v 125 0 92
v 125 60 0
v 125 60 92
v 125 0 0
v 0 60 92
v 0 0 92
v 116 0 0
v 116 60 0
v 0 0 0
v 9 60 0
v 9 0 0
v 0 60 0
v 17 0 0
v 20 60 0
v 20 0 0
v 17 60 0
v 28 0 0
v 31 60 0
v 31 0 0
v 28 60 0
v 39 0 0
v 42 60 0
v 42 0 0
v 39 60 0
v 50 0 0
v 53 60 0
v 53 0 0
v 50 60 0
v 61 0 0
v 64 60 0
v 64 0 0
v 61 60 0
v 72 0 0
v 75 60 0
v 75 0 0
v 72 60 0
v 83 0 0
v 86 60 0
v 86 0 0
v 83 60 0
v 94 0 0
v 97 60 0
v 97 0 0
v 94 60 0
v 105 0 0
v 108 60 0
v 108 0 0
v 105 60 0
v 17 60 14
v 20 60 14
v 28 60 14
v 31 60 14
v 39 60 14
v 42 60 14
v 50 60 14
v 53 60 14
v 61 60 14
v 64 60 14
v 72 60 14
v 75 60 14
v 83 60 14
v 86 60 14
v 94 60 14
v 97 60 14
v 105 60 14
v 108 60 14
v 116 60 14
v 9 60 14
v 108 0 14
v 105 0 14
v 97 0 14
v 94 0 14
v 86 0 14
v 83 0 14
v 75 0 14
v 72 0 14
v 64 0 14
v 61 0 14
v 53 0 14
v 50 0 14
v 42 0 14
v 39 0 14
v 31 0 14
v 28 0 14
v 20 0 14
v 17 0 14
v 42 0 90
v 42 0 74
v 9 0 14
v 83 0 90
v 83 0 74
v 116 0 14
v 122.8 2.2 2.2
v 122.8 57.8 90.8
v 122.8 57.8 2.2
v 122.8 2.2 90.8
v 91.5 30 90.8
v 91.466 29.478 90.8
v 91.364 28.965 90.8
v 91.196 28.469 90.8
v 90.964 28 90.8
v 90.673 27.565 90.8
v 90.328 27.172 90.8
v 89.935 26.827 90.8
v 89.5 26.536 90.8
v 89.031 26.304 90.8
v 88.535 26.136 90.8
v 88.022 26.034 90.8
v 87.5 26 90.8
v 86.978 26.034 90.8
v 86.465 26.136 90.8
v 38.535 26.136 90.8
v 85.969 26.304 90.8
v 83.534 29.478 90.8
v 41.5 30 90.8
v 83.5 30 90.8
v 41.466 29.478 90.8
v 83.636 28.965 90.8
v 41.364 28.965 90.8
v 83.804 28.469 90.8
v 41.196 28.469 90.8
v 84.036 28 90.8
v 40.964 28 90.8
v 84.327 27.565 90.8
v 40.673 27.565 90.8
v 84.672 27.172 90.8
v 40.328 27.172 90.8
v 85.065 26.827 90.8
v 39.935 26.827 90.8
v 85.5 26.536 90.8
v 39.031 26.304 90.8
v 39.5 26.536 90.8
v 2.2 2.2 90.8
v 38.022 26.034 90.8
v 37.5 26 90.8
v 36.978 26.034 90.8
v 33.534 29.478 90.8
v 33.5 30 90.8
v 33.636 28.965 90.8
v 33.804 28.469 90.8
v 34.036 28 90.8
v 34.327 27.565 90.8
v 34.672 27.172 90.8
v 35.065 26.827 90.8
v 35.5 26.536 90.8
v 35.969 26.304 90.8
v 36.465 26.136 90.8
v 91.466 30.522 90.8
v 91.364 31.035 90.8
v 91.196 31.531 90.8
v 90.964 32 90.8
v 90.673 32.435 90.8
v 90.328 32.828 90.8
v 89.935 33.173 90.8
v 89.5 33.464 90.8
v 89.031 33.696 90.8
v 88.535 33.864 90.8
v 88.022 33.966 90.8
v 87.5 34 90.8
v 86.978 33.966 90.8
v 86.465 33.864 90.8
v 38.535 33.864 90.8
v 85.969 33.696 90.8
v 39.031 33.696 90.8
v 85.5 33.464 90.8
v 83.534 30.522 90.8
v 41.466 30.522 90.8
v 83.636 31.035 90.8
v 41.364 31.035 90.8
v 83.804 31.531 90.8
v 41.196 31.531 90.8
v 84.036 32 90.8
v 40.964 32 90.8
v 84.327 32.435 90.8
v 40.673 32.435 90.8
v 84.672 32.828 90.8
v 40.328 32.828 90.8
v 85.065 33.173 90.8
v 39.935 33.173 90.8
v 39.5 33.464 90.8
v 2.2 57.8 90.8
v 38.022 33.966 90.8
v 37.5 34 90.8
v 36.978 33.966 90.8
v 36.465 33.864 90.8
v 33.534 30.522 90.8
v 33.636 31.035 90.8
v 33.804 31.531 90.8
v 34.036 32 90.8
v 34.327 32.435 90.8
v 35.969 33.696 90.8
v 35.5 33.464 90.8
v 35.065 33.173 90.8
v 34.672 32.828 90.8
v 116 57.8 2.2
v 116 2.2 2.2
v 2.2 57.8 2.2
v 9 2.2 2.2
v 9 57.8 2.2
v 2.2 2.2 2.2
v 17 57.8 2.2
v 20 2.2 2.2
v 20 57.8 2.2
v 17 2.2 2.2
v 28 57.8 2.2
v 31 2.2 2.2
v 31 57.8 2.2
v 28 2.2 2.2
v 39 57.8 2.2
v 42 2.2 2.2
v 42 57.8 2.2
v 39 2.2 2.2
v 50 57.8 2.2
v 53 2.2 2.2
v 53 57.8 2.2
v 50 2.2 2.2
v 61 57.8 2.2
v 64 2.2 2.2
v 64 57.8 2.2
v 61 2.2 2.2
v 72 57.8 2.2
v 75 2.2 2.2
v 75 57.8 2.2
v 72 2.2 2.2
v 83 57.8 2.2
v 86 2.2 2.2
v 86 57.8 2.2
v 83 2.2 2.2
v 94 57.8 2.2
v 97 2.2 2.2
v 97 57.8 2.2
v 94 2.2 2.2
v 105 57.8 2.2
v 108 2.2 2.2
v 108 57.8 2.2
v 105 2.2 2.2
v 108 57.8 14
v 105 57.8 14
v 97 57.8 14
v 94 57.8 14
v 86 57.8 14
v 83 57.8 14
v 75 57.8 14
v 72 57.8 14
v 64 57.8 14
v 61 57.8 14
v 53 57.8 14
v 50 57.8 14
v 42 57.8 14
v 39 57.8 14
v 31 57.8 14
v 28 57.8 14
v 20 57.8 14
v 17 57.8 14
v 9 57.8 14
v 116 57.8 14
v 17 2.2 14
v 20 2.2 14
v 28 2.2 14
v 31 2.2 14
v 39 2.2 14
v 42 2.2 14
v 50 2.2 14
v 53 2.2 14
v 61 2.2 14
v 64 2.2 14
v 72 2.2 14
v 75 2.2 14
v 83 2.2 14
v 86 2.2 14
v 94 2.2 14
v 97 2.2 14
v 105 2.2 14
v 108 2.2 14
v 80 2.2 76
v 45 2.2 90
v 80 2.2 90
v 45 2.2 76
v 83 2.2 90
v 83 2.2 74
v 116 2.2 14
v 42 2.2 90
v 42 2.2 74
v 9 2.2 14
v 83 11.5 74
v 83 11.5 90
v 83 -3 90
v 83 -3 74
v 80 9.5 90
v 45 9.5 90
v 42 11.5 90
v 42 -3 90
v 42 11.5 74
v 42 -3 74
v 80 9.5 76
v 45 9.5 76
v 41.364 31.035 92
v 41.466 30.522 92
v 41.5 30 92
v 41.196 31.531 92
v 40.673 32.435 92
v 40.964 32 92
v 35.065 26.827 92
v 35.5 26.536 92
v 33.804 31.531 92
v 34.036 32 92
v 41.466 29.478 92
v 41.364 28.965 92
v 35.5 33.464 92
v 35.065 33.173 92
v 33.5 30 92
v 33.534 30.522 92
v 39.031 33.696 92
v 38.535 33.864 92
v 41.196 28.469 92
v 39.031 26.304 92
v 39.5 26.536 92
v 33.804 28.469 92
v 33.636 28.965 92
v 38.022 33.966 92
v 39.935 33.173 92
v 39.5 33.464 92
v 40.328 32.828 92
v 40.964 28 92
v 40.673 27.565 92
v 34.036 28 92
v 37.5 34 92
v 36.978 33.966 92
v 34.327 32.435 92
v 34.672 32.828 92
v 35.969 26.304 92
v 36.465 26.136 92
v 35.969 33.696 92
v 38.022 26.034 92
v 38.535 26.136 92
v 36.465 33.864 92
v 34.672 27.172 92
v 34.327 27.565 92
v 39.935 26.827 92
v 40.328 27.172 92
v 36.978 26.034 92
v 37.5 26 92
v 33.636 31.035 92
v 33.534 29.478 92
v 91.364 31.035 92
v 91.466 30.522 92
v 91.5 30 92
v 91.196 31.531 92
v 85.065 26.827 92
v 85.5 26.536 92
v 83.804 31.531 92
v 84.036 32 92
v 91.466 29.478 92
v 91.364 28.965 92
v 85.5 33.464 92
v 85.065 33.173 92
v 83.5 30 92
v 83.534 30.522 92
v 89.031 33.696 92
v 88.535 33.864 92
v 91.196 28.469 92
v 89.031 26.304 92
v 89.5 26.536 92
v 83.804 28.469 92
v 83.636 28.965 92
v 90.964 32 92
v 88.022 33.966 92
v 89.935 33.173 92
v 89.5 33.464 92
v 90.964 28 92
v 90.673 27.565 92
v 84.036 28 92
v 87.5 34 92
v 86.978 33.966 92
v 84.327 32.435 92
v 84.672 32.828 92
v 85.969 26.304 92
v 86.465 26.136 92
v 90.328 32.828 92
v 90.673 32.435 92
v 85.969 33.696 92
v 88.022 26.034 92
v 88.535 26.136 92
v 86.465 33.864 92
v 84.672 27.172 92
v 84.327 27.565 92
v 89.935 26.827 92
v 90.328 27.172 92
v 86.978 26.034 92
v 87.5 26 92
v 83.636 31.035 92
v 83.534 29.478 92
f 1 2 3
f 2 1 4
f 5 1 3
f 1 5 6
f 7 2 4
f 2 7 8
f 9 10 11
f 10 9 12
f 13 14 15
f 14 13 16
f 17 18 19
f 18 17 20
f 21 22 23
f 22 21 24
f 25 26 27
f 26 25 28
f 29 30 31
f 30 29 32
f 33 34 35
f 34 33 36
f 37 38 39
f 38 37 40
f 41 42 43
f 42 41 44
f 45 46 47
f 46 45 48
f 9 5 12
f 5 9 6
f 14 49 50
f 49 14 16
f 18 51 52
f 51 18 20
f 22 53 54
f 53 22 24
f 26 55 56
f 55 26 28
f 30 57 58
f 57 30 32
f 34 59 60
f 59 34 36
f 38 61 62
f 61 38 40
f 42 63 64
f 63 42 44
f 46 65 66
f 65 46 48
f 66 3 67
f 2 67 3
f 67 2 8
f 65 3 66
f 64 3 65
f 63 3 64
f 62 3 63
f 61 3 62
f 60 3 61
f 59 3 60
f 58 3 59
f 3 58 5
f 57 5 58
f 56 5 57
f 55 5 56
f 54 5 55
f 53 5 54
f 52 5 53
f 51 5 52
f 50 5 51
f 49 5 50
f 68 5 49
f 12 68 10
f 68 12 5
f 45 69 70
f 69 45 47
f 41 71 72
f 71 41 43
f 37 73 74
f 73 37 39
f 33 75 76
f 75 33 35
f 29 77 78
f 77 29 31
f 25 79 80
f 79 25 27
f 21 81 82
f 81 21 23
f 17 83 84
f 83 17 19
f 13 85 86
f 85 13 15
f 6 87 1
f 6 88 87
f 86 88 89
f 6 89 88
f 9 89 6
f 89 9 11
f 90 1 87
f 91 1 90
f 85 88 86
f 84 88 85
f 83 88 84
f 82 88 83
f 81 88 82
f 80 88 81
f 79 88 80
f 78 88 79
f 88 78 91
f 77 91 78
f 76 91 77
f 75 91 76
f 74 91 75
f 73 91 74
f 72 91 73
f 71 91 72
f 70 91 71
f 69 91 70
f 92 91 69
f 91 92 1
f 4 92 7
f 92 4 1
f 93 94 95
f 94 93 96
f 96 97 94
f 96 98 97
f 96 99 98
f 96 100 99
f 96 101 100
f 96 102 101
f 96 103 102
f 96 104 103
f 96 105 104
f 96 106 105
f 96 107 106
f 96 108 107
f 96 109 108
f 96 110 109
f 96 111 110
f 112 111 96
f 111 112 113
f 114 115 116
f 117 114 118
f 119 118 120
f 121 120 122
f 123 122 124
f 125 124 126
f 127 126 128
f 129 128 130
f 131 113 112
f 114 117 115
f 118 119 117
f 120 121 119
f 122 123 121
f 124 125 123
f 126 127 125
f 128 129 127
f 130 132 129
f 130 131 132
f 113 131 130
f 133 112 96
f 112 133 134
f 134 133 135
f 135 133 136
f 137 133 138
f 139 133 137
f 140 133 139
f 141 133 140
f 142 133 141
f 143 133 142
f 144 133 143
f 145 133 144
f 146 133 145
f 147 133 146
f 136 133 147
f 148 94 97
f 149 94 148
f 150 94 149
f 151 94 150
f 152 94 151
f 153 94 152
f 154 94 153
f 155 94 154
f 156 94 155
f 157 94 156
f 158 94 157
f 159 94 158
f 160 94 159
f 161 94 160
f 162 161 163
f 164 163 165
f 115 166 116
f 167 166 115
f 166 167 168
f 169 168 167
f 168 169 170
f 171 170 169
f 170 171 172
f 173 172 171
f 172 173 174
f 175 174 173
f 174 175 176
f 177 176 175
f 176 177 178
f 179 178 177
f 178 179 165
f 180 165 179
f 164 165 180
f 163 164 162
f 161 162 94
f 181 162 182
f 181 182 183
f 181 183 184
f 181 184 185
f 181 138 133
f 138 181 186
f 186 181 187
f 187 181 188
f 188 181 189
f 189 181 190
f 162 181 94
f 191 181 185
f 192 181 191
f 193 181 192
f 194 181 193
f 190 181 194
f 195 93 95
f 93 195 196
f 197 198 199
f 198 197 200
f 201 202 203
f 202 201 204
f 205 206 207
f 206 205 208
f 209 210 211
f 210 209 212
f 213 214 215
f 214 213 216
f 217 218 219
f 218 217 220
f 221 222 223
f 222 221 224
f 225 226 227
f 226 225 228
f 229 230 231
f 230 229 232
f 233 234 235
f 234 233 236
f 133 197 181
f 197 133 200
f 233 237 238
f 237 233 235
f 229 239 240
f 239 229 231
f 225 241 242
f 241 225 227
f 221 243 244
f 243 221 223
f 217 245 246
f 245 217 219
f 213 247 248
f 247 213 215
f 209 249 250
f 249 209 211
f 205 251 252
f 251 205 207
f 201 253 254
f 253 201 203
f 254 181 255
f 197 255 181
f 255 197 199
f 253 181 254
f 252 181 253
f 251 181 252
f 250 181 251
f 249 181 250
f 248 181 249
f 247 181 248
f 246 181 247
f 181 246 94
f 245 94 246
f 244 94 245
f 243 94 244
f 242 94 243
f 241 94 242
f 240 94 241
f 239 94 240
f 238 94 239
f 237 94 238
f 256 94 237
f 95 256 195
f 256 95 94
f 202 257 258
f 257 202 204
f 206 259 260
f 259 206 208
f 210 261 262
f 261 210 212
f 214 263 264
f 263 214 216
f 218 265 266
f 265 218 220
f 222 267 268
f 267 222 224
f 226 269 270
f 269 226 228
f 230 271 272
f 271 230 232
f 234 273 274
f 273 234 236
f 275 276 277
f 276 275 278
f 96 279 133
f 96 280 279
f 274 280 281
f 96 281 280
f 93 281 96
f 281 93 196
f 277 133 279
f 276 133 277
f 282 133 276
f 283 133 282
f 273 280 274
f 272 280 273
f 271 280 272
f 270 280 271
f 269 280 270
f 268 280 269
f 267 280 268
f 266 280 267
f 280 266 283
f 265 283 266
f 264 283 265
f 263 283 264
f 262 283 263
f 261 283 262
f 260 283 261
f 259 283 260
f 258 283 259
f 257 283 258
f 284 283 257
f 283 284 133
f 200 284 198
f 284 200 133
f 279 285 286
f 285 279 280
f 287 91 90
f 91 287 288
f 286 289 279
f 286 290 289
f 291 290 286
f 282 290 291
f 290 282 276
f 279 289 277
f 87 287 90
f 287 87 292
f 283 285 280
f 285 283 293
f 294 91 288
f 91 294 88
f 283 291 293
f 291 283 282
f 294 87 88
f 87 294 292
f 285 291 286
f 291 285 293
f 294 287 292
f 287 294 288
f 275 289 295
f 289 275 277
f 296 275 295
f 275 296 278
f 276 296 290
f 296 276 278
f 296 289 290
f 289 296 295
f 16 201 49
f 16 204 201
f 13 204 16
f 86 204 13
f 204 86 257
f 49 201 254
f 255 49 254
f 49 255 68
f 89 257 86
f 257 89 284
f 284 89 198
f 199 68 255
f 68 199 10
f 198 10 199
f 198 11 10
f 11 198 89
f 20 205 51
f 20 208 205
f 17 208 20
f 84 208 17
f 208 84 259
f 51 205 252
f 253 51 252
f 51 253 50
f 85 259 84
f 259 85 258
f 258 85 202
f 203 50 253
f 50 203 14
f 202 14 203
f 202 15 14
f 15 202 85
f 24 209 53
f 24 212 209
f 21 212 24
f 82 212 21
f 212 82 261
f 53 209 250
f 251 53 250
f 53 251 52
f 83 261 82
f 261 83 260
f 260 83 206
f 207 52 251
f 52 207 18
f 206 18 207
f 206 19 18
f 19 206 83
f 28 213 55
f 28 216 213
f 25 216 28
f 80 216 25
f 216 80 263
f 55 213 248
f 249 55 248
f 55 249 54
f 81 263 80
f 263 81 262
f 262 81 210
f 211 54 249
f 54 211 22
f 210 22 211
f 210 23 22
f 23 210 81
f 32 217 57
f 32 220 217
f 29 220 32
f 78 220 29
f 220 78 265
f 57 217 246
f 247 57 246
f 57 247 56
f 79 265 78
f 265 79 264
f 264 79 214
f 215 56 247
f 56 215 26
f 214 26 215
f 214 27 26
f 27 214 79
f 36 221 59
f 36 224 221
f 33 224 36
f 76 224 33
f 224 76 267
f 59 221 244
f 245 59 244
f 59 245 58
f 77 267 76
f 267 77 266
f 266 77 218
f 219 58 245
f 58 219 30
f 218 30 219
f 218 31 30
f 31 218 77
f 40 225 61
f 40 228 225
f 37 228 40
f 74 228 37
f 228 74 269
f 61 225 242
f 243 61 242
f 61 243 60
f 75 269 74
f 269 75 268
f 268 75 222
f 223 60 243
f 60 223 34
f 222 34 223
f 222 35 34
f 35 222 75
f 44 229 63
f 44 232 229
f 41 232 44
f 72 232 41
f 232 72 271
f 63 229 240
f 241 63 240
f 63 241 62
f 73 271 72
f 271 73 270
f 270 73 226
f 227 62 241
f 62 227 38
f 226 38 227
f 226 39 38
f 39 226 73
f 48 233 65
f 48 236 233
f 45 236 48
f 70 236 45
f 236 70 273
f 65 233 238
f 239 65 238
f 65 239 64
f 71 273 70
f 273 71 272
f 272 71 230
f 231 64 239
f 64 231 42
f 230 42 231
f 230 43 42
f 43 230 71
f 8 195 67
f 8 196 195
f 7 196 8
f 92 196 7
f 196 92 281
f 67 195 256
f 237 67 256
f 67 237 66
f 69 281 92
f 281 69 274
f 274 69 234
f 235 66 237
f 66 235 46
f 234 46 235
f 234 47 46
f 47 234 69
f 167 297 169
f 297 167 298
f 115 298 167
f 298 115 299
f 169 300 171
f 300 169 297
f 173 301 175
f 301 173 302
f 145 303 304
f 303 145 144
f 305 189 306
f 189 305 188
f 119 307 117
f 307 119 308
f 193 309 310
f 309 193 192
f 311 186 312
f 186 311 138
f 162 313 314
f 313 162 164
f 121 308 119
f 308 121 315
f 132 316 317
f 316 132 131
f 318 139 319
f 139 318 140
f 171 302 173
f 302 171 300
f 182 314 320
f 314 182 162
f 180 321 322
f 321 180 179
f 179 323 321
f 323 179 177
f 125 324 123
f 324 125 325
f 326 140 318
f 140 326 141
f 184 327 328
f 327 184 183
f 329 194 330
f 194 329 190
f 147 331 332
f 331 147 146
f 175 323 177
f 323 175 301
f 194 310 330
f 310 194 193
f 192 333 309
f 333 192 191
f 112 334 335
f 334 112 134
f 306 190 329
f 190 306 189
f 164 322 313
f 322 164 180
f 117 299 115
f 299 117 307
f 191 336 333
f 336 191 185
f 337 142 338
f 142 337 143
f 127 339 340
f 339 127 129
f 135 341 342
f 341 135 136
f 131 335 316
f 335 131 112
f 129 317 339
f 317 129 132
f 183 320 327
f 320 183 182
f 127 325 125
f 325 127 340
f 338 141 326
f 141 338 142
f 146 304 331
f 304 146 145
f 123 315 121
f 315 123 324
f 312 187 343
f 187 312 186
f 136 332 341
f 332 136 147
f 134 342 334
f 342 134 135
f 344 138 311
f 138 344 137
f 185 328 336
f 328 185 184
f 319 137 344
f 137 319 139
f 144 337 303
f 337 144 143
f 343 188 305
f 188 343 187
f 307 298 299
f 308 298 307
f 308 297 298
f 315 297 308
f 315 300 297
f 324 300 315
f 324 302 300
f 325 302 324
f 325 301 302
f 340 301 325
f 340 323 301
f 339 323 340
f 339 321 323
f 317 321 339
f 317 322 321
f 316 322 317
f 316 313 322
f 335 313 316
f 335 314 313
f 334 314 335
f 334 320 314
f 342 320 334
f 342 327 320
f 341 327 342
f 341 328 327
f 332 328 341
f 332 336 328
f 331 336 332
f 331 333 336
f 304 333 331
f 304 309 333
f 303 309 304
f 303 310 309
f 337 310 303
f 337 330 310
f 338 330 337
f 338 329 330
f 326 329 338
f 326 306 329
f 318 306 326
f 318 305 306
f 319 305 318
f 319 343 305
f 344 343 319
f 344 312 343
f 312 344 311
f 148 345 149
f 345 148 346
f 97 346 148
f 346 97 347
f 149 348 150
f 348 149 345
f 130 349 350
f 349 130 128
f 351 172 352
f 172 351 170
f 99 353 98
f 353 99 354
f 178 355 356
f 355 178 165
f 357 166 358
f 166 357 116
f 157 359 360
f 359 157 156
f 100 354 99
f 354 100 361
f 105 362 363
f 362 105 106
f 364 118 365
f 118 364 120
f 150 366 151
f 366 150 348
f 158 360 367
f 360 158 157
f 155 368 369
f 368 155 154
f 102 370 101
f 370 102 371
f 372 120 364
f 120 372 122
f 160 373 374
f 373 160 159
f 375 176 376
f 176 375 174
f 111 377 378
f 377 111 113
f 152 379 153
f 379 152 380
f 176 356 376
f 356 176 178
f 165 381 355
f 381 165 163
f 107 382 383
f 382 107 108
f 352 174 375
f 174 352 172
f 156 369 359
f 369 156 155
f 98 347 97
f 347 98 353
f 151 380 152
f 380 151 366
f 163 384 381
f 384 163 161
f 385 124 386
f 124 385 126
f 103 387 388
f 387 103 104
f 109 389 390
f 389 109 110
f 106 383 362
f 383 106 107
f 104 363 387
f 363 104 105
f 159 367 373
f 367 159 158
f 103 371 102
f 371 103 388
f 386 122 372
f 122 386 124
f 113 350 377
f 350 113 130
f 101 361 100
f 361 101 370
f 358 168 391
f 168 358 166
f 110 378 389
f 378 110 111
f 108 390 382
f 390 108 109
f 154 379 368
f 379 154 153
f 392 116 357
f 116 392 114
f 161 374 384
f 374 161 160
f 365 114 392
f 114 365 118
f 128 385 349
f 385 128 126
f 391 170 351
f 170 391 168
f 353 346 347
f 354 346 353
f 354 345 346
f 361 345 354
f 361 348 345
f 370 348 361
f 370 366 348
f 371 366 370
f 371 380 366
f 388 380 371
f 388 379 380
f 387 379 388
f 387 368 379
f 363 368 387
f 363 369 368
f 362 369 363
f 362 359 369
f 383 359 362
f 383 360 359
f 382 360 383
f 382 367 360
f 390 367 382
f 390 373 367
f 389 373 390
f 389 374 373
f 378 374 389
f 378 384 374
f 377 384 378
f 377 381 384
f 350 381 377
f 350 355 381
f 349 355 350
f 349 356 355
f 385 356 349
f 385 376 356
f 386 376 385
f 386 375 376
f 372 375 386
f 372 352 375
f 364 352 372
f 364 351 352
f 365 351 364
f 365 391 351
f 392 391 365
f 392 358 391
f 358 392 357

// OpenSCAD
// Pano Beyni — DIN ray kutusu (parametrik OpenSCAD kaynagi)
// Sahip: Kisi C. Malzeme: V-0 (UL94/IEC 60695-11-10) polikarbonat, sartname 2.2.1.xiii.
// Referans govde: Fibox ARCA 92/125 sinifi (hardware/pano-beyni/bom.csv).
// Konnektorler io-tablosu.md ile birebir (J1-J10); alt kenarda vidali klemens kesikleri,
// ust kenarda anten delikleri (RF + hucresel, sartname 2.2.8.1.iv harici anten cikisi).
//
// NOT (STATUS.md karar #4): bu gelistirme ortaminda `openscad` calistirilamadi (kurulu degil,
// internet erisimi yok); dolayisiyla STL BU TESLIMDE URETILMEDI. Bu dosya OpenSCAD kurulu bir
// makinede `openscad -o din-kutu.stl din-kutu.scad` ile dogrudan STL'e cevrilebilir durumdadir.
// Asagidaki olculer BOM'daki referans govdeyle (Fibox ARCA 92/125) tutarli secilmistir.

/* [Govde olculeri] */
box_width  = 125; // mm, DIN raya paralel (yaklasik 7 DIN modulu)
box_height = 92;  // mm
box_depth  = 60;  // mm, pano ust bolmesindeki derinlige gore (450 mm derinlikli povnun icinde bolluk var)
wall = 2.2;       // mm, V-0 polikarbonat cidar kalinligi

/* [DIN ray klipsi -- EN 50022, 35 mm top-hat ray] */
din_rail_width = 35;
din_rail_depth = 7.5;
din_clip_travel = 4; // yayli klips esneme payi

/* [Konnektor kesikleri (io-tablosu.md J1-J10, alt kenar)] */
conn_w = 8; conn_h = 14; conn_gap = 3;
conn_count = 10;

/* [Anten delikleri (ust kenar)] */
ant_hole_d = 8; // SMA/U.FL gecis deligi

$fn = 48;

module govde_kabuk() {
    difference() {
        cube([box_width, box_depth, box_height]);
        translate([wall, wall, wall])
            cube([box_width - 2*wall, box_depth - 2*wall, box_height - 2*wall + 1]);
    }
}

module din_klips() {
    // Arka yuzeyde, EN 50022 35 mm raya oturan basit yayli klips govdesi.
    translate([box_width/2 - din_rail_width/2 - 3, -3, box_height - 18])
        difference() {
            cube([din_rail_width + 6, din_rail_depth + din_clip_travel + 3, 16]);
            translate([3, din_clip_travel, 2])
                cube([din_rail_width, din_rail_depth + 1, 14]);
        }
}

module alt_konnektor_kesikleri() {
    toplam = conn_count * conn_w + (conn_count - 1) * conn_gap;
    baslangic = (box_width - toplam) / 2;
    for (i = [0 : conn_count - 1])
        translate([baslangic + i * (conn_w + conn_gap), -1, -1])
            cube([conn_w, box_depth + 2, conn_h + 1]);
}

module ust_anten_delikleri() {
    // 2 delik: 802.15.4/BLE (U.FL uzeri kisa pigtail) + hucresel modem SMA.
    translate([box_width * 0.3, box_depth/2, -1])
        cylinder(d = ant_hole_d, h = wall + 2);
    translate([box_width * 0.7, box_depth/2, -1])
        cylinder(d = ant_hole_d, h = wall + 2);
}

module pano_beyni_kutu() {
    difference() {
        union() {
            govde_kabuk();
            din_klips();
        }
        alt_konnektor_kesikleri();
        translate([0, 0, box_height - wall - 1]) ust_anten_delikleri();
    }
}

pano_beyni_kutu();

// Montaj notlari:
// - Kapak (bu dosyada modellenmedi) 4x M3 kilitli vida ile sabitlenir, contali (IP20 dahili).
// - Kart montaj ayaklari kutunun ic tabaninda 4x M2.5 spacer (bu revizyonda eklenmedi).
// - Konformal kaplamali kart, kutunun icine kaydirmali raylarla yerlesir (bkz. blok-diyagrami.md S2).
